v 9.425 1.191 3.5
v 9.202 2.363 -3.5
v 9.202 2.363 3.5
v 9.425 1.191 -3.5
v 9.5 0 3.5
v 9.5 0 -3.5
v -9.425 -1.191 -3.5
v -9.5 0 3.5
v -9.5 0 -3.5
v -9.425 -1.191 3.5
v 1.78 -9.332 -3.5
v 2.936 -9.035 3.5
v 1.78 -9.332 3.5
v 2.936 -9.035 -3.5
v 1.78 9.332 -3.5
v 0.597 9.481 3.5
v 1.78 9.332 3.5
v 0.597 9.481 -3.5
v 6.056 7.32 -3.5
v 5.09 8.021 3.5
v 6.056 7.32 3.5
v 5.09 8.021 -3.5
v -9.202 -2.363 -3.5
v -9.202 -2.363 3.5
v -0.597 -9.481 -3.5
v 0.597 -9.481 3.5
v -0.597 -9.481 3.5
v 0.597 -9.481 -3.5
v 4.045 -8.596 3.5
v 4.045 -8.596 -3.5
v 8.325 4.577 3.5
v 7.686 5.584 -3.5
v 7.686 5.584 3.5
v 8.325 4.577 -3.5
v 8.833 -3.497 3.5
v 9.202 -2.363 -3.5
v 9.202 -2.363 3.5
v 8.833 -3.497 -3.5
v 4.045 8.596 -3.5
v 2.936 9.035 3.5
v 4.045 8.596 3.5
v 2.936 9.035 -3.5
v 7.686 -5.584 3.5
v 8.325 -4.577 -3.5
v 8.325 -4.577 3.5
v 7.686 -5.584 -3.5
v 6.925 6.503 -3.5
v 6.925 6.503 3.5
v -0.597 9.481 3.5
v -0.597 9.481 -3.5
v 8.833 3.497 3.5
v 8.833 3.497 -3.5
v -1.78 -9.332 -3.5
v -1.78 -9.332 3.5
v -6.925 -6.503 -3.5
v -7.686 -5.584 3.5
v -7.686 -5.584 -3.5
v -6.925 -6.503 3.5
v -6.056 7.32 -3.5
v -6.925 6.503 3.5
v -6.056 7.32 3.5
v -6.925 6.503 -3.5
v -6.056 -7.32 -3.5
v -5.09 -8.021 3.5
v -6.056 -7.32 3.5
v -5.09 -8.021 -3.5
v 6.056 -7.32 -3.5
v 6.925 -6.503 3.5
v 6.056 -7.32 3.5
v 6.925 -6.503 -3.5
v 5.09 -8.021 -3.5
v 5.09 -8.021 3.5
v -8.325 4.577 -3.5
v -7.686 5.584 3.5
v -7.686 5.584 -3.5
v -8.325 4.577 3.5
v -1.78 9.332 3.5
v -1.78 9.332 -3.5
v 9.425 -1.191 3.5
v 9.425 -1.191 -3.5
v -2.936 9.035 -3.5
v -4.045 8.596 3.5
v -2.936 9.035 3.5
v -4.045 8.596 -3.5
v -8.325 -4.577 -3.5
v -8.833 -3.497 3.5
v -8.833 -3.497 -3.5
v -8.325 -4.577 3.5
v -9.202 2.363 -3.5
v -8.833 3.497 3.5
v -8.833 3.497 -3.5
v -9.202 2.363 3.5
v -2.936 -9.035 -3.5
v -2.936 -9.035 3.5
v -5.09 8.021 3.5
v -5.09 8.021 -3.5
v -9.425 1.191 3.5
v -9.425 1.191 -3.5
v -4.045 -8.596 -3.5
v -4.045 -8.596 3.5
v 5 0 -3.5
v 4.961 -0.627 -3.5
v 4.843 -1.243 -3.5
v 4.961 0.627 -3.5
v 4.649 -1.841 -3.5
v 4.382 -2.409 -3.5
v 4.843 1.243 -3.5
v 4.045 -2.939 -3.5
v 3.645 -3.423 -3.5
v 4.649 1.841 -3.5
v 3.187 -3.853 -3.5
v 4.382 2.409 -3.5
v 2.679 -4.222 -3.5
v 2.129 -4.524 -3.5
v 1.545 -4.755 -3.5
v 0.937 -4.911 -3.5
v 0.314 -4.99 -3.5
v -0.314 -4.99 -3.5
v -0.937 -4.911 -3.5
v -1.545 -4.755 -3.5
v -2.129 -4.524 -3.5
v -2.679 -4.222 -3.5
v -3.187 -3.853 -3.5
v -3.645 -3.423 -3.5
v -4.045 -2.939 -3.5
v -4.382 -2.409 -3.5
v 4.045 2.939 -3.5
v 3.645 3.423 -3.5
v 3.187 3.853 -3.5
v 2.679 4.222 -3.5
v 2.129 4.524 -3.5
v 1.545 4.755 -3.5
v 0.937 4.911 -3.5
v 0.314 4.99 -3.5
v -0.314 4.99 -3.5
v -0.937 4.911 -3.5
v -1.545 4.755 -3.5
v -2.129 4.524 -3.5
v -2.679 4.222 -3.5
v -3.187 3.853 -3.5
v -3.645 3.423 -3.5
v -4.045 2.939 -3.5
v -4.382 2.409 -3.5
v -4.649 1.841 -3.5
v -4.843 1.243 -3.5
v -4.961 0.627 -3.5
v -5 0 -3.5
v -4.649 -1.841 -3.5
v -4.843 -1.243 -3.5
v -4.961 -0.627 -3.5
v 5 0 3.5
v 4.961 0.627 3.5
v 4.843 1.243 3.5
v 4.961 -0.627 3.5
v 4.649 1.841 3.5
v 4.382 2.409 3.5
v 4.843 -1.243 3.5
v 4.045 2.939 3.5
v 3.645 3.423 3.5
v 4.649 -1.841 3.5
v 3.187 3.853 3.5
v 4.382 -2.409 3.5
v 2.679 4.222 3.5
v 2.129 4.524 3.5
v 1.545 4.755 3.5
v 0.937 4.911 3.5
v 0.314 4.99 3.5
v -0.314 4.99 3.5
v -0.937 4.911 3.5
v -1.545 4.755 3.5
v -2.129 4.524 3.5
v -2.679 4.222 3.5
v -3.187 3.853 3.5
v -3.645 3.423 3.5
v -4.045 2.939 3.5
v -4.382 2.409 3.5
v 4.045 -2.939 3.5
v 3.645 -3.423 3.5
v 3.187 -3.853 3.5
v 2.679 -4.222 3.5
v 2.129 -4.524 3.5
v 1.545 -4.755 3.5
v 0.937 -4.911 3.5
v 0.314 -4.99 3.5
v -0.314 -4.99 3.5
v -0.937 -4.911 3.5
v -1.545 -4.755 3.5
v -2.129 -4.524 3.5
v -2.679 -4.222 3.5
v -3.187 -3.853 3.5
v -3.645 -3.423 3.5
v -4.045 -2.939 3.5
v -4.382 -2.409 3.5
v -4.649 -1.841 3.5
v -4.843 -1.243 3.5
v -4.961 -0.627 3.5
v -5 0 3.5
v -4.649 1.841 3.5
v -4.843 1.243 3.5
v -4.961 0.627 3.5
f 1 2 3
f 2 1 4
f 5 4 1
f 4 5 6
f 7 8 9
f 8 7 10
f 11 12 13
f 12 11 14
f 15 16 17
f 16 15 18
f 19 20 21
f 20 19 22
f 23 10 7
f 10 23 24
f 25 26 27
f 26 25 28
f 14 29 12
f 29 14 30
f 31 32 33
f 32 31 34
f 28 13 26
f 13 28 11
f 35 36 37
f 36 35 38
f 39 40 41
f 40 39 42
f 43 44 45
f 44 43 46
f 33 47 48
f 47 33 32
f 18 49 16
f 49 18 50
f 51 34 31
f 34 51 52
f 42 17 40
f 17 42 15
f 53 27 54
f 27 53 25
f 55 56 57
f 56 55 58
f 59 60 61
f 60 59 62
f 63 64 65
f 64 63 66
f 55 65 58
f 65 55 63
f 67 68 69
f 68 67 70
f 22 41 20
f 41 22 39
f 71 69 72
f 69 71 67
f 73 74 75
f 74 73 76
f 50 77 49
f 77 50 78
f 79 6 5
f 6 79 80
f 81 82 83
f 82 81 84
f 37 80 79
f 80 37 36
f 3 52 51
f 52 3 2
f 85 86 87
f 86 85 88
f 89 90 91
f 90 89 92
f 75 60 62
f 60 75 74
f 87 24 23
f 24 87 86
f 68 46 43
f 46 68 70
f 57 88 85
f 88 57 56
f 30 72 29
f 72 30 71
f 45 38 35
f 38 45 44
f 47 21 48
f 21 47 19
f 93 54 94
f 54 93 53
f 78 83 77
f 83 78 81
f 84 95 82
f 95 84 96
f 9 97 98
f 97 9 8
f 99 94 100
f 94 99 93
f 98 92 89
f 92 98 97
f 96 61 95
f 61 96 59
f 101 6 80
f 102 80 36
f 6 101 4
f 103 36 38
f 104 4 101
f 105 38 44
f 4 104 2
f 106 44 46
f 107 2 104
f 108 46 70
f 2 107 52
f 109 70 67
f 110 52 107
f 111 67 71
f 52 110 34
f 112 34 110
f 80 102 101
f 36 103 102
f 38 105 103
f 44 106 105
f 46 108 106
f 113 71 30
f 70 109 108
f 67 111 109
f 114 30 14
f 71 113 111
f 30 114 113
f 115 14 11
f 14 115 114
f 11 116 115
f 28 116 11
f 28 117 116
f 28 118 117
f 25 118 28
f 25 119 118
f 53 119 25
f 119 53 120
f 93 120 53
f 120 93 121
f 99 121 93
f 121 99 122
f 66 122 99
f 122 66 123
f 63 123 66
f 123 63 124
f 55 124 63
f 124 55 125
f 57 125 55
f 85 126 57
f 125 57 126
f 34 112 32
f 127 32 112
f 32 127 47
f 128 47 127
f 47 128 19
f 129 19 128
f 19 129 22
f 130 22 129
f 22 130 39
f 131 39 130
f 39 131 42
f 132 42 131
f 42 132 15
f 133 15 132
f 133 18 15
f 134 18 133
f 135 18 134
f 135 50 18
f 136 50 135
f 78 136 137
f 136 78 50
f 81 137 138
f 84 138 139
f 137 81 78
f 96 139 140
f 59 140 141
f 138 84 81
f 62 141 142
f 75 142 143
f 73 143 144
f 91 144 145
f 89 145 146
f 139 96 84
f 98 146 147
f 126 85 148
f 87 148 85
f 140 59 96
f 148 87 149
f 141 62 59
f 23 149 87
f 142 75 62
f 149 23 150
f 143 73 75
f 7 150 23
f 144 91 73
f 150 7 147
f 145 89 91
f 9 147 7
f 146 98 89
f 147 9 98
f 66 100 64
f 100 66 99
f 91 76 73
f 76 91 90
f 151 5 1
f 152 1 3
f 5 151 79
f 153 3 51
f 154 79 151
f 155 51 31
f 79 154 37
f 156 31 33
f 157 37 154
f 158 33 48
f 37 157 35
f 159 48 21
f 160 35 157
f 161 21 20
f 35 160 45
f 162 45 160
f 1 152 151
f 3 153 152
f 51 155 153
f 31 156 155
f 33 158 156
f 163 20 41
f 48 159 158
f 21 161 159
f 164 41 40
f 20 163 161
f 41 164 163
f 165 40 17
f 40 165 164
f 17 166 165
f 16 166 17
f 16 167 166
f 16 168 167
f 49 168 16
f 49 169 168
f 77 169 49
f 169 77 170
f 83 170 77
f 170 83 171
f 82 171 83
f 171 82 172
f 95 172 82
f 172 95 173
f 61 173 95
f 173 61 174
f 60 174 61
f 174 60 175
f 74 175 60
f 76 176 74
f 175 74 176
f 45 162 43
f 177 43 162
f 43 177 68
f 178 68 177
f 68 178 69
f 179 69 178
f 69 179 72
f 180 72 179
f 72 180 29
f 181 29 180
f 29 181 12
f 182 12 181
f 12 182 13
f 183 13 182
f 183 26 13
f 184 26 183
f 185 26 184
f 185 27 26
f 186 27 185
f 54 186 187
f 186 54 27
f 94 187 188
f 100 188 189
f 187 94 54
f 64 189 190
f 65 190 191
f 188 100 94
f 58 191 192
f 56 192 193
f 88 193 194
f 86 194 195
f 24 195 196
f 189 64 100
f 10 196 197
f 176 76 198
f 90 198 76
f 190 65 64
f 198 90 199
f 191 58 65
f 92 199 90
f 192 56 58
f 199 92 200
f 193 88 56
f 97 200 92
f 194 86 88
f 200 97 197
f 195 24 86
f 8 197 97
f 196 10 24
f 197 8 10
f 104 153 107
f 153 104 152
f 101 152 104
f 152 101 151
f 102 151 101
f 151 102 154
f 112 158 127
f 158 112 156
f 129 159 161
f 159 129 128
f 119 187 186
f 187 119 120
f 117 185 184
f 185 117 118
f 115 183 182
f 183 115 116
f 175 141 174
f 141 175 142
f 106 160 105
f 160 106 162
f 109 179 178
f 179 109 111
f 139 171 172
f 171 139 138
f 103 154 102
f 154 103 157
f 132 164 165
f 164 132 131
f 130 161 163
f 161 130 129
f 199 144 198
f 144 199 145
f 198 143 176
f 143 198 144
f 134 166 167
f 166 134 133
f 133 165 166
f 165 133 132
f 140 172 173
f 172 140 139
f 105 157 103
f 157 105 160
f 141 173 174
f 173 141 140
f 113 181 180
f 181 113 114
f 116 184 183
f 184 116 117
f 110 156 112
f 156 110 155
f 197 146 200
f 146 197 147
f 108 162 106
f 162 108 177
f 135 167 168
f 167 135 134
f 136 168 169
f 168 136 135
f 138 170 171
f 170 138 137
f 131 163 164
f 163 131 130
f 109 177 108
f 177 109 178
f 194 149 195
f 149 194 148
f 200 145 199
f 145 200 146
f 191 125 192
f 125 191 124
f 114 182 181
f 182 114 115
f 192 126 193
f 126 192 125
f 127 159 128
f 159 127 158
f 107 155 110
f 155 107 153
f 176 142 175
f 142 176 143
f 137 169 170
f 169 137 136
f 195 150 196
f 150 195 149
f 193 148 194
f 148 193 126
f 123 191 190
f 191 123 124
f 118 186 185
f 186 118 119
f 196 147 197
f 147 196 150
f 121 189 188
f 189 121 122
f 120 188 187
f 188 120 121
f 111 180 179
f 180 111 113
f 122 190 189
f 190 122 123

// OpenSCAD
$fn = 50;


difference() {
	union() {
		translate(v = [0, 0, -3.5000000000]) {
			cylinder(h = 7, r = 9.5000000000);
		}
	}
	union() {
		translate(v = [0, 0, -100.0000000000]) {
			cylinder(h = 200, r = 5.0000000000);
		}
	}
}
